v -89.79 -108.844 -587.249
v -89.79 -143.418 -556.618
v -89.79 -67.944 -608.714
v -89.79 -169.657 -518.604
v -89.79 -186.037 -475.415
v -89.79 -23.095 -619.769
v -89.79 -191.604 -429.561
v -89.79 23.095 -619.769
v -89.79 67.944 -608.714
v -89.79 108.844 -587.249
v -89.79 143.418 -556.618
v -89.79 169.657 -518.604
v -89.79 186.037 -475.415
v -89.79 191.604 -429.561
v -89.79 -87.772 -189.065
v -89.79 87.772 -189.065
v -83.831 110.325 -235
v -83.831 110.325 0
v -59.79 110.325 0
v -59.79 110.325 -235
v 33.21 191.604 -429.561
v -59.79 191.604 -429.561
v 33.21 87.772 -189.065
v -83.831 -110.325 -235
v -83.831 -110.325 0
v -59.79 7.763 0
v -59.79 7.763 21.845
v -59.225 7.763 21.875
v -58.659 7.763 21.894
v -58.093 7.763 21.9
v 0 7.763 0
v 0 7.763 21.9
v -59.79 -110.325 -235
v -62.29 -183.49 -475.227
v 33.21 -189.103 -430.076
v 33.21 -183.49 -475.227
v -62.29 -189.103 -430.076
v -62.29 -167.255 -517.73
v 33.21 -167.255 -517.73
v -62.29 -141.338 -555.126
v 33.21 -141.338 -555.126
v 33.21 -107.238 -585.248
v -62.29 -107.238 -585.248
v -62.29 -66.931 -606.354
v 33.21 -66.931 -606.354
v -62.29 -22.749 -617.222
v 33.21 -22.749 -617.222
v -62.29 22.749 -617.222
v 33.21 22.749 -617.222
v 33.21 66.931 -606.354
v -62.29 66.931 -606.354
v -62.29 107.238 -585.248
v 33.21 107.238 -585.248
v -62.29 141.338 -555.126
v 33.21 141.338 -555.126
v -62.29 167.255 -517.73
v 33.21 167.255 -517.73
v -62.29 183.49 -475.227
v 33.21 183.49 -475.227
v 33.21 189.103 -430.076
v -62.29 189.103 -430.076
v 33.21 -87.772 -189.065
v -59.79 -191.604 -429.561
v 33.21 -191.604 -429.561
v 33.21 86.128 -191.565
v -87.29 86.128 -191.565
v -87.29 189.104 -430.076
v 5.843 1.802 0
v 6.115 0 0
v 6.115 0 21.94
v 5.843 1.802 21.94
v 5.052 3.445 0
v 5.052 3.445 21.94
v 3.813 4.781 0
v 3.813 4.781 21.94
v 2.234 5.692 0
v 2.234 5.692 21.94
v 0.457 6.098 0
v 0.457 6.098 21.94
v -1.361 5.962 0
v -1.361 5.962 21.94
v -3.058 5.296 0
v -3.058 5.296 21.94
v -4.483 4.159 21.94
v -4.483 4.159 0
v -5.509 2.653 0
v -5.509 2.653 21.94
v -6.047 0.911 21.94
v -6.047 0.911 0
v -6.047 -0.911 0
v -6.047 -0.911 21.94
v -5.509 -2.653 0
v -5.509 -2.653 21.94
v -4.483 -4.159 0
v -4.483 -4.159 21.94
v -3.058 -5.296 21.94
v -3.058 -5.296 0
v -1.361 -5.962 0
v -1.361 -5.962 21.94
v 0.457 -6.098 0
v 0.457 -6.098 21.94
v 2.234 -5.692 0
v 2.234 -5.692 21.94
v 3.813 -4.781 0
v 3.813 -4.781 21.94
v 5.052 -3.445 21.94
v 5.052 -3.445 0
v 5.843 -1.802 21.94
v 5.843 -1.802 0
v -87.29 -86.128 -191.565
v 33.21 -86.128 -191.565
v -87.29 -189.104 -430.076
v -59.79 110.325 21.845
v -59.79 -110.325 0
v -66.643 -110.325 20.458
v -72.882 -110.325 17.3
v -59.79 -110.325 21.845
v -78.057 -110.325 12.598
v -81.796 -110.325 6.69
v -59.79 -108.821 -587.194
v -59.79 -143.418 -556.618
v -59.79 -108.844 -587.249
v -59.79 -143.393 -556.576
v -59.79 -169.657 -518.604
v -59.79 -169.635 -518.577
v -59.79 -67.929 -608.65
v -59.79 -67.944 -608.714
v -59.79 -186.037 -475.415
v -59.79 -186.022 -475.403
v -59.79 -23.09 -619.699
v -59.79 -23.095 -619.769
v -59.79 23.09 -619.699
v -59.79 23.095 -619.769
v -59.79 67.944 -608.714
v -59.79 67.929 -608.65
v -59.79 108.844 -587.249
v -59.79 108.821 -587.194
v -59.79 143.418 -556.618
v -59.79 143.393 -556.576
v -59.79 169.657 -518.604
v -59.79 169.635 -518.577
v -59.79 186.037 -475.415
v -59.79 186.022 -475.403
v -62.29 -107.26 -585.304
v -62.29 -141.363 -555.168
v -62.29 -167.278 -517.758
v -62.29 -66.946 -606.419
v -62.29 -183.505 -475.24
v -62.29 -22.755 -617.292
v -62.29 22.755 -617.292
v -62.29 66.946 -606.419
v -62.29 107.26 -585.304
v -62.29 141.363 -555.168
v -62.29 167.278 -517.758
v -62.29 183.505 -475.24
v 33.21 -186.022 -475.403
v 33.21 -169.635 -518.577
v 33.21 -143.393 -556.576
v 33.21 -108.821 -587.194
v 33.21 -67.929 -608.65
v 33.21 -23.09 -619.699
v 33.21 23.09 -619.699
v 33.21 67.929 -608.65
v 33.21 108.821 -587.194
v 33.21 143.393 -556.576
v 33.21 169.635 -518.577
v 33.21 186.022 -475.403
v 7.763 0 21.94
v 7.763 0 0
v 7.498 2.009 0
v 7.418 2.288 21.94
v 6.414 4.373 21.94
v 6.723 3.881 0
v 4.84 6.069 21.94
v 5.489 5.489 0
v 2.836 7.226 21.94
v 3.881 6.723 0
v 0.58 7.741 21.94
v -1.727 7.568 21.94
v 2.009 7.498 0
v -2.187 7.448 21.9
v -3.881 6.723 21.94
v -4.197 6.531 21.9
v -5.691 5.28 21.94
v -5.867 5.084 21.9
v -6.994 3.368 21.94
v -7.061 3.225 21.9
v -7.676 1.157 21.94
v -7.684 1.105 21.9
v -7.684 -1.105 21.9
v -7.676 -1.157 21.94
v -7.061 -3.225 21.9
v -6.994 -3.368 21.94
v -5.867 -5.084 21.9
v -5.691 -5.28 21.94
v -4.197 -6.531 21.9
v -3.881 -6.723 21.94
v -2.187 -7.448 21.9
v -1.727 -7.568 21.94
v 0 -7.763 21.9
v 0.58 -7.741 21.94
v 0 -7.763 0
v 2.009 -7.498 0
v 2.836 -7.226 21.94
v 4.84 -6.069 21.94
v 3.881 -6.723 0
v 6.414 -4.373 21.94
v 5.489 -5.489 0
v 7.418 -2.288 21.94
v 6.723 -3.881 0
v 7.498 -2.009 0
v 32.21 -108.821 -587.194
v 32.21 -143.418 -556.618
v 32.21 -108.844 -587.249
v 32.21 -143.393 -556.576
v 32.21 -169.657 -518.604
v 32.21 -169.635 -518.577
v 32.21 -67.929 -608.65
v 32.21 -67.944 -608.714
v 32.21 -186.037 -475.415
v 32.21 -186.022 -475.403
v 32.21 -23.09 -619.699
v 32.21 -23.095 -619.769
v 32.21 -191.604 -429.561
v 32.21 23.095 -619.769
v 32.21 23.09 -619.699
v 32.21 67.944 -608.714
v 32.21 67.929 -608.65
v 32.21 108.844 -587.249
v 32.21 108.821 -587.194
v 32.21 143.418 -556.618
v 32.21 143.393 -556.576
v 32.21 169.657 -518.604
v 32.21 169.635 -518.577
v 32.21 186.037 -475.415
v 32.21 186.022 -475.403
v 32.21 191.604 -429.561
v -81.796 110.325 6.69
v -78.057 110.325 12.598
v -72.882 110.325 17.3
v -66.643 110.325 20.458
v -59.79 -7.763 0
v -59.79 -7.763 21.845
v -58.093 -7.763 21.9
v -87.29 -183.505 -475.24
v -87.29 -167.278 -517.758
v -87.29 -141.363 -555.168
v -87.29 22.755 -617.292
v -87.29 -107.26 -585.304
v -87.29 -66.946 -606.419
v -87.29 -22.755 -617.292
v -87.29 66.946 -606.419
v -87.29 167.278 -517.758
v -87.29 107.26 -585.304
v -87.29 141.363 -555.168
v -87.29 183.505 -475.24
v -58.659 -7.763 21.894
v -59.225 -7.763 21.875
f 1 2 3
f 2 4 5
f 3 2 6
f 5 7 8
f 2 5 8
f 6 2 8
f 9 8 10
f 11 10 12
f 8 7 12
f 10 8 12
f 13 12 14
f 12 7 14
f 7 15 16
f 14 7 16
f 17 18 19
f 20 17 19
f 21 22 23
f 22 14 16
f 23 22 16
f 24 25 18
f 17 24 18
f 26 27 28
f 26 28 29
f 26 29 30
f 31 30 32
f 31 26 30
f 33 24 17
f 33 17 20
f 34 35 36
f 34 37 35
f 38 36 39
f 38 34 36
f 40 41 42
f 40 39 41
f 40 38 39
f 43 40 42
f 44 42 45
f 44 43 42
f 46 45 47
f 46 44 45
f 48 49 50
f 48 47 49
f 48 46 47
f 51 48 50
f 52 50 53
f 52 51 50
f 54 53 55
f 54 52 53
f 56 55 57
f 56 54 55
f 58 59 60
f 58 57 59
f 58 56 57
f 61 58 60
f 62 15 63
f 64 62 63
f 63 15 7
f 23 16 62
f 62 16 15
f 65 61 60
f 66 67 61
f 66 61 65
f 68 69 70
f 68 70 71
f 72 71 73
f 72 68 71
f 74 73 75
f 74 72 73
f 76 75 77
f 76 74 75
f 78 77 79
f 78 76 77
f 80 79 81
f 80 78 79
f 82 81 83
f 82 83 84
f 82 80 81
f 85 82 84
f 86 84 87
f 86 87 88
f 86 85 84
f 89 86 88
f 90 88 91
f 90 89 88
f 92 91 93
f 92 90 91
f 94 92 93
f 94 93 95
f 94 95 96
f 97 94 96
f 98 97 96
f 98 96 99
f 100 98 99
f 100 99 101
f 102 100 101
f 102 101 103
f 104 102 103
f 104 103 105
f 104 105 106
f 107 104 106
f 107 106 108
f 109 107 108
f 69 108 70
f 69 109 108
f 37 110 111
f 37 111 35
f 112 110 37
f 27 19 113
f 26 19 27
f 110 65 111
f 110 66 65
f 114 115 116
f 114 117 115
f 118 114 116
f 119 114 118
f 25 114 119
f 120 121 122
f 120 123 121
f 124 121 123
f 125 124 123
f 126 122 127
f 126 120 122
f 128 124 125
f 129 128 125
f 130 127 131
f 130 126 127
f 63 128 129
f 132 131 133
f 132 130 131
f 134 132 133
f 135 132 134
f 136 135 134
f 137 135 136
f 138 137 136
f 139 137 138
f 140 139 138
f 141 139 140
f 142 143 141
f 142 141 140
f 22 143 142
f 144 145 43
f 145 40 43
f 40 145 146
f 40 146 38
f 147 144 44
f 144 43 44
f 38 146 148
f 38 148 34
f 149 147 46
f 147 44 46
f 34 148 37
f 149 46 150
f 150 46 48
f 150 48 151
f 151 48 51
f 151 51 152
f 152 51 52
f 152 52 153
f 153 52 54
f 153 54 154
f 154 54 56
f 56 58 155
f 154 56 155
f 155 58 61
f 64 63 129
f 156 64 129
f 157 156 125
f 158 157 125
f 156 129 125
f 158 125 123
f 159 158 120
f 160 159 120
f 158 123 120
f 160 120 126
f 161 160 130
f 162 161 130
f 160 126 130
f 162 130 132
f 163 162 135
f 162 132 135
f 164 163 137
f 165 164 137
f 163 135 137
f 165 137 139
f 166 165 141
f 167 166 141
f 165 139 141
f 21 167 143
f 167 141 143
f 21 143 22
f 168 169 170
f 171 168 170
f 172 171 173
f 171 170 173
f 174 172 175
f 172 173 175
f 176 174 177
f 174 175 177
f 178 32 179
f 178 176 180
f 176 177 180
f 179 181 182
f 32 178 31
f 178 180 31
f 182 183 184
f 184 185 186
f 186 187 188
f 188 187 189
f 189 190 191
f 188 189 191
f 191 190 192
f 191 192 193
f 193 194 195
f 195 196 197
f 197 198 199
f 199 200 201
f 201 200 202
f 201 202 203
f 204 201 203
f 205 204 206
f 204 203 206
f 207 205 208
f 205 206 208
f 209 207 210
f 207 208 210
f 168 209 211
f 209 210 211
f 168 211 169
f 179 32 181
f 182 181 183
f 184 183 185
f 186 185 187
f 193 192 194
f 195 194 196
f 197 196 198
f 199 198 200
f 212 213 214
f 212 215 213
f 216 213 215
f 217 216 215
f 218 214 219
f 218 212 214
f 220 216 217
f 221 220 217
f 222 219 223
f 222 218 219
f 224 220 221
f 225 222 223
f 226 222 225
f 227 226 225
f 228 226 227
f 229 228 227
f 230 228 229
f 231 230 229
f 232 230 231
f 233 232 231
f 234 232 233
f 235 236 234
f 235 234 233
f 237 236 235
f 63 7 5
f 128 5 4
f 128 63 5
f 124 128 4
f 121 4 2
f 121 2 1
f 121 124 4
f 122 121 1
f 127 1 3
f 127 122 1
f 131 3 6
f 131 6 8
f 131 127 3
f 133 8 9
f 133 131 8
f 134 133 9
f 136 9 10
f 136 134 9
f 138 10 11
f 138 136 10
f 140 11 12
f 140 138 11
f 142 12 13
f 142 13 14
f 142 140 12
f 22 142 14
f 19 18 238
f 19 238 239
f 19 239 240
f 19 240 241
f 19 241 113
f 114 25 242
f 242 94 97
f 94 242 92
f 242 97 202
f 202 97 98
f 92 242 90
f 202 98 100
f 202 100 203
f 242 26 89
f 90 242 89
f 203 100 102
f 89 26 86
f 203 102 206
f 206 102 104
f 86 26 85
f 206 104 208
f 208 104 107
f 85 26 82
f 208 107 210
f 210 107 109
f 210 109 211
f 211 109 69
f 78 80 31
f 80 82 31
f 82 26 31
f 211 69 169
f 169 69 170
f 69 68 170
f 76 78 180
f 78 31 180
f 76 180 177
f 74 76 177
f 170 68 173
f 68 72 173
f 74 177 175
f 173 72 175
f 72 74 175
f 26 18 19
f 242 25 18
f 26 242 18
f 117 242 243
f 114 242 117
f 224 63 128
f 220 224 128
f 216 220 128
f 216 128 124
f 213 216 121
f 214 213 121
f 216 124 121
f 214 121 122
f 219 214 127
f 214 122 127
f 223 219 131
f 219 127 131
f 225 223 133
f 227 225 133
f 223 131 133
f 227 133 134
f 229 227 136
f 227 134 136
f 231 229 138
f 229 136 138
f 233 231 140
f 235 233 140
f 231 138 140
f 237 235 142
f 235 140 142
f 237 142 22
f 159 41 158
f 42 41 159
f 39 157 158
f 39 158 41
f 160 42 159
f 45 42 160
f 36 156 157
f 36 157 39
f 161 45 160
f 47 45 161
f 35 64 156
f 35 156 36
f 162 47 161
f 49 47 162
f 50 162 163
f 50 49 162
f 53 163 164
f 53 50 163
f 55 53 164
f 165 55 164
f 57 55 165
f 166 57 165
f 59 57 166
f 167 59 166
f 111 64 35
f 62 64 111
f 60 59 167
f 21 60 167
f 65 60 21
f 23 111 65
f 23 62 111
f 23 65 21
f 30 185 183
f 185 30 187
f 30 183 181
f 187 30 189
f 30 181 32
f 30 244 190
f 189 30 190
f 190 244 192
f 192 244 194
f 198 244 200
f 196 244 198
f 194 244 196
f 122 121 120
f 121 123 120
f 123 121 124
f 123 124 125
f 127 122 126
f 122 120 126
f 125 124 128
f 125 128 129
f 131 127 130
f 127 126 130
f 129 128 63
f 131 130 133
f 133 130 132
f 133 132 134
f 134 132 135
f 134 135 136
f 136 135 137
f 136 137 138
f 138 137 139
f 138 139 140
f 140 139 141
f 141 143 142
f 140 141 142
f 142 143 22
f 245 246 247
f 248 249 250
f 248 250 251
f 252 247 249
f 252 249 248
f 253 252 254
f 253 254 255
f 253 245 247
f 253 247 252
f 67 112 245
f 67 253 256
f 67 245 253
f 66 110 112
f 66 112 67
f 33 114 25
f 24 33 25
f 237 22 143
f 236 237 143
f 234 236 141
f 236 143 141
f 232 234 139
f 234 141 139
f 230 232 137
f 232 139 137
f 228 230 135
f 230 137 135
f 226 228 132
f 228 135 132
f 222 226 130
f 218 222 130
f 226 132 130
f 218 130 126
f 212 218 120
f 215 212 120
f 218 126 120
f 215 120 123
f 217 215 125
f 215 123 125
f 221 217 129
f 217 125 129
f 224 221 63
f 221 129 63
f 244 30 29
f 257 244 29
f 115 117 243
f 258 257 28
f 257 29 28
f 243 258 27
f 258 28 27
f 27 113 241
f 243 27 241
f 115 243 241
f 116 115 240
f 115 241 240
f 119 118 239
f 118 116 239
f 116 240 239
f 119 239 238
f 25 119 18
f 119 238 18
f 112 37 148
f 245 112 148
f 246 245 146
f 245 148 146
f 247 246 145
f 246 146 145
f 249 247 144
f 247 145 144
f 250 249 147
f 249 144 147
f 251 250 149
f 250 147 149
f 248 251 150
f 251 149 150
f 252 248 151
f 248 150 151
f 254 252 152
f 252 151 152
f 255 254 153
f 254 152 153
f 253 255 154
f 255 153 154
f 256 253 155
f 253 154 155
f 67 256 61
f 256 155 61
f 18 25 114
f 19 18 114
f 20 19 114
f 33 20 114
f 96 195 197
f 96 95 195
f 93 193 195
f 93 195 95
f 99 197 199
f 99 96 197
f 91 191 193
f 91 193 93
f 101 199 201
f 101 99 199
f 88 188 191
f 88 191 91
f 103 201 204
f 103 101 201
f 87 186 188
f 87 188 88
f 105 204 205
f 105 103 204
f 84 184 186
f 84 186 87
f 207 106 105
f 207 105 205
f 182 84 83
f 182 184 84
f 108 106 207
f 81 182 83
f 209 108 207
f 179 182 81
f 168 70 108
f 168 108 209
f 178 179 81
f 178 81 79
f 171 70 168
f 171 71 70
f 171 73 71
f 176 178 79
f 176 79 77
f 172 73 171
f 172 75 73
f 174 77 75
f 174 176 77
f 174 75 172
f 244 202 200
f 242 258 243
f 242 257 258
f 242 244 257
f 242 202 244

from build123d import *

# Parameters (mm, degrees)
F0_R        = 7.7629536733
F0_R_2      = 6.115
F1_DEPTH    = 21.94
F3_DEPTH    = 21.9
F4_T1_DEPTH = 349.3365371959
F7_DEPTH    = 30
F8_DEPTH    = 235
F10_DEPTH   = 93
F11_T       = -2.5
F12_DEPTH   = 92


# Not quite as in the source:
# - a fillet or chamfer that OpenCascade refuses, or shapes differently, is made with other operations: its cross-section is extruded or revolved along the edge and cut away or added


with BuildPart() as f1:
    # F0 (on Top) → F1 (new body)
    with BuildSketch(Plane.XY):
        Circle(F0_R)
        Circle(F0_R_2, mode=Mode.SUBTRACT)
    extrude(amount=F1_DEPTH)

    # F2 (on face) → F3 (join)
    with BuildSketch(Plane(origin=(0, 0, 0), x_dir=(1, 0, 0), z_dir=(0, 0, -1))):
        with BuildLine():
            ThreePointArc((0, -7.7629536733), (-7.7629536733, 0), (0, 7.7629536733))
            Line((0, 7.7629536733), (-59.79, 7.7629536733))
            Line((-59.79, 7.7629536733), (-59.79, 110.3249713778))
            Line((-59.79, 110.3249713778), (-83.8307887316, 110.3249713778))
            Line((-83.8307887316, 110.3249713778), (-83.8307887316, 0))
            Line((-83.8307887316, 0), (-83.8307887316, -110.3249713778))
            Line((-83.8307887316, -110.3249713778), (-59.79, -110.3249713778))
            Line((-59.79, -110.3249713778), (-59.79, -7.7629536733))
            Line((-59.79, -7.7629536733), (0, -7.7629536733))
        make_face()
    extrude(amount=-F3_DEPTH)

    # F4: fillet of radius 26.0735064736 on 1 edges, made by hand

    # F4_s2 → F4_t1 (cut)
    with BuildSketch(Plane.XZ.offset(-174.668268598)):
        with BuildLine():
            ThreePointArc((-58.0934698435, 21.9), (-74.9903599682, 15.6840574239), (-83.8307887316, 0))
            Line((-83.8307887316, 0), (-83.8307887316, 21.9))
            Line((-83.8307887316, 21.9), (-58.0934698435, 21.9))
        make_face()
    extrude(amount=F4_T1_DEPTH, mode=Mode.SUBTRACT)


with BuildPart() as f7:
    # F6 (on face) → F7 (new body)
    with BuildSketch(Plane.YZ.offset(-59.79)):
        with BuildLine():
            Line((-87.7716502015, -189.0654966483), (-191.6043754912, -429.56122756))
            ThreePointArc((-191.6043754912, -429.56122756), (0, -621.1656030512), (191.6043754912, -429.56122756))
            Line((191.6043754912, -429.56122756), (87.7716502015, -189.0654966483))
            Line((87.7716502015, -189.0654966483), (-87.7716502015, -189.0654966483))
        make_face()
    extrude(amount=-F7_DEPTH)

    # F9 (on face) → F10 (join)
    with BuildSketch(Plane.YZ.offset(-59.79)):
        with BuildLine():
            Line((-87.7716502015, -189.0654966483), (-191.6043754912, -429.56122756))
            ThreePointArc((-191.6043754912, -429.56122756), (0, -621.0952325876), (191.6043754912, -429.56122756))
            Line((191.6043754912, -429.56122756), (87.7716502015, -189.0654966483))
            Line((87.7716502015, -189.0654966483), (-87.7716502015, -189.0654966483))
        make_face()
    extrude(amount=F10_DEPTH)

    # F11
    f11_openings = [f7.faces().sort_by_distance(p)[0] for p in [
        (33.21, 0, -410.391358),
    ]]
    offset(amount=F11_T, openings=f11_openings, kind=Kind.INTERSECTION)


with BuildPart() as f8:
    # F5 (on face) → F8 (new body)
    with BuildSketch(Plane(origin=(0, 0, 0), x_dir=(1, 0, 0), z_dir=(0, 0, -1))):
        Polygon((-83.8307887316, 110.3249713778), (-83.8307887316, -110.3249713778), (-59.79, -110.3249713778), (-59.79, -7.7629536733), (-59.79, 7.7629536733), (-59.79, 110.3249713778), align=None)
    extrude(amount=F8_DEPTH)


with BuildPart() as f12:
    # F10_face (on face) → F12 (new body)
    with BuildSketch(Plane(origin=(-59.79, 4e-10, -580.0199905498), x_dir=(0, 1, 0), z_dir=(1, 0, 0))):
        with BuildLine():
            ThreePointArc((-191.6043754916, 150.4587629897), (-4e-10, -41.1456125014), (191.6043754908, 150.4587629897))
            ThreePointArc((191.6043754908, 150.4587629897), (-4e-10, -41.0752420379), (-191.6043754916, 150.4587629897))
        make_face()
    extrude(amount=F12_DEPTH)


solid = Compound([f1.part, f7.part, f8.part, f12.part])
